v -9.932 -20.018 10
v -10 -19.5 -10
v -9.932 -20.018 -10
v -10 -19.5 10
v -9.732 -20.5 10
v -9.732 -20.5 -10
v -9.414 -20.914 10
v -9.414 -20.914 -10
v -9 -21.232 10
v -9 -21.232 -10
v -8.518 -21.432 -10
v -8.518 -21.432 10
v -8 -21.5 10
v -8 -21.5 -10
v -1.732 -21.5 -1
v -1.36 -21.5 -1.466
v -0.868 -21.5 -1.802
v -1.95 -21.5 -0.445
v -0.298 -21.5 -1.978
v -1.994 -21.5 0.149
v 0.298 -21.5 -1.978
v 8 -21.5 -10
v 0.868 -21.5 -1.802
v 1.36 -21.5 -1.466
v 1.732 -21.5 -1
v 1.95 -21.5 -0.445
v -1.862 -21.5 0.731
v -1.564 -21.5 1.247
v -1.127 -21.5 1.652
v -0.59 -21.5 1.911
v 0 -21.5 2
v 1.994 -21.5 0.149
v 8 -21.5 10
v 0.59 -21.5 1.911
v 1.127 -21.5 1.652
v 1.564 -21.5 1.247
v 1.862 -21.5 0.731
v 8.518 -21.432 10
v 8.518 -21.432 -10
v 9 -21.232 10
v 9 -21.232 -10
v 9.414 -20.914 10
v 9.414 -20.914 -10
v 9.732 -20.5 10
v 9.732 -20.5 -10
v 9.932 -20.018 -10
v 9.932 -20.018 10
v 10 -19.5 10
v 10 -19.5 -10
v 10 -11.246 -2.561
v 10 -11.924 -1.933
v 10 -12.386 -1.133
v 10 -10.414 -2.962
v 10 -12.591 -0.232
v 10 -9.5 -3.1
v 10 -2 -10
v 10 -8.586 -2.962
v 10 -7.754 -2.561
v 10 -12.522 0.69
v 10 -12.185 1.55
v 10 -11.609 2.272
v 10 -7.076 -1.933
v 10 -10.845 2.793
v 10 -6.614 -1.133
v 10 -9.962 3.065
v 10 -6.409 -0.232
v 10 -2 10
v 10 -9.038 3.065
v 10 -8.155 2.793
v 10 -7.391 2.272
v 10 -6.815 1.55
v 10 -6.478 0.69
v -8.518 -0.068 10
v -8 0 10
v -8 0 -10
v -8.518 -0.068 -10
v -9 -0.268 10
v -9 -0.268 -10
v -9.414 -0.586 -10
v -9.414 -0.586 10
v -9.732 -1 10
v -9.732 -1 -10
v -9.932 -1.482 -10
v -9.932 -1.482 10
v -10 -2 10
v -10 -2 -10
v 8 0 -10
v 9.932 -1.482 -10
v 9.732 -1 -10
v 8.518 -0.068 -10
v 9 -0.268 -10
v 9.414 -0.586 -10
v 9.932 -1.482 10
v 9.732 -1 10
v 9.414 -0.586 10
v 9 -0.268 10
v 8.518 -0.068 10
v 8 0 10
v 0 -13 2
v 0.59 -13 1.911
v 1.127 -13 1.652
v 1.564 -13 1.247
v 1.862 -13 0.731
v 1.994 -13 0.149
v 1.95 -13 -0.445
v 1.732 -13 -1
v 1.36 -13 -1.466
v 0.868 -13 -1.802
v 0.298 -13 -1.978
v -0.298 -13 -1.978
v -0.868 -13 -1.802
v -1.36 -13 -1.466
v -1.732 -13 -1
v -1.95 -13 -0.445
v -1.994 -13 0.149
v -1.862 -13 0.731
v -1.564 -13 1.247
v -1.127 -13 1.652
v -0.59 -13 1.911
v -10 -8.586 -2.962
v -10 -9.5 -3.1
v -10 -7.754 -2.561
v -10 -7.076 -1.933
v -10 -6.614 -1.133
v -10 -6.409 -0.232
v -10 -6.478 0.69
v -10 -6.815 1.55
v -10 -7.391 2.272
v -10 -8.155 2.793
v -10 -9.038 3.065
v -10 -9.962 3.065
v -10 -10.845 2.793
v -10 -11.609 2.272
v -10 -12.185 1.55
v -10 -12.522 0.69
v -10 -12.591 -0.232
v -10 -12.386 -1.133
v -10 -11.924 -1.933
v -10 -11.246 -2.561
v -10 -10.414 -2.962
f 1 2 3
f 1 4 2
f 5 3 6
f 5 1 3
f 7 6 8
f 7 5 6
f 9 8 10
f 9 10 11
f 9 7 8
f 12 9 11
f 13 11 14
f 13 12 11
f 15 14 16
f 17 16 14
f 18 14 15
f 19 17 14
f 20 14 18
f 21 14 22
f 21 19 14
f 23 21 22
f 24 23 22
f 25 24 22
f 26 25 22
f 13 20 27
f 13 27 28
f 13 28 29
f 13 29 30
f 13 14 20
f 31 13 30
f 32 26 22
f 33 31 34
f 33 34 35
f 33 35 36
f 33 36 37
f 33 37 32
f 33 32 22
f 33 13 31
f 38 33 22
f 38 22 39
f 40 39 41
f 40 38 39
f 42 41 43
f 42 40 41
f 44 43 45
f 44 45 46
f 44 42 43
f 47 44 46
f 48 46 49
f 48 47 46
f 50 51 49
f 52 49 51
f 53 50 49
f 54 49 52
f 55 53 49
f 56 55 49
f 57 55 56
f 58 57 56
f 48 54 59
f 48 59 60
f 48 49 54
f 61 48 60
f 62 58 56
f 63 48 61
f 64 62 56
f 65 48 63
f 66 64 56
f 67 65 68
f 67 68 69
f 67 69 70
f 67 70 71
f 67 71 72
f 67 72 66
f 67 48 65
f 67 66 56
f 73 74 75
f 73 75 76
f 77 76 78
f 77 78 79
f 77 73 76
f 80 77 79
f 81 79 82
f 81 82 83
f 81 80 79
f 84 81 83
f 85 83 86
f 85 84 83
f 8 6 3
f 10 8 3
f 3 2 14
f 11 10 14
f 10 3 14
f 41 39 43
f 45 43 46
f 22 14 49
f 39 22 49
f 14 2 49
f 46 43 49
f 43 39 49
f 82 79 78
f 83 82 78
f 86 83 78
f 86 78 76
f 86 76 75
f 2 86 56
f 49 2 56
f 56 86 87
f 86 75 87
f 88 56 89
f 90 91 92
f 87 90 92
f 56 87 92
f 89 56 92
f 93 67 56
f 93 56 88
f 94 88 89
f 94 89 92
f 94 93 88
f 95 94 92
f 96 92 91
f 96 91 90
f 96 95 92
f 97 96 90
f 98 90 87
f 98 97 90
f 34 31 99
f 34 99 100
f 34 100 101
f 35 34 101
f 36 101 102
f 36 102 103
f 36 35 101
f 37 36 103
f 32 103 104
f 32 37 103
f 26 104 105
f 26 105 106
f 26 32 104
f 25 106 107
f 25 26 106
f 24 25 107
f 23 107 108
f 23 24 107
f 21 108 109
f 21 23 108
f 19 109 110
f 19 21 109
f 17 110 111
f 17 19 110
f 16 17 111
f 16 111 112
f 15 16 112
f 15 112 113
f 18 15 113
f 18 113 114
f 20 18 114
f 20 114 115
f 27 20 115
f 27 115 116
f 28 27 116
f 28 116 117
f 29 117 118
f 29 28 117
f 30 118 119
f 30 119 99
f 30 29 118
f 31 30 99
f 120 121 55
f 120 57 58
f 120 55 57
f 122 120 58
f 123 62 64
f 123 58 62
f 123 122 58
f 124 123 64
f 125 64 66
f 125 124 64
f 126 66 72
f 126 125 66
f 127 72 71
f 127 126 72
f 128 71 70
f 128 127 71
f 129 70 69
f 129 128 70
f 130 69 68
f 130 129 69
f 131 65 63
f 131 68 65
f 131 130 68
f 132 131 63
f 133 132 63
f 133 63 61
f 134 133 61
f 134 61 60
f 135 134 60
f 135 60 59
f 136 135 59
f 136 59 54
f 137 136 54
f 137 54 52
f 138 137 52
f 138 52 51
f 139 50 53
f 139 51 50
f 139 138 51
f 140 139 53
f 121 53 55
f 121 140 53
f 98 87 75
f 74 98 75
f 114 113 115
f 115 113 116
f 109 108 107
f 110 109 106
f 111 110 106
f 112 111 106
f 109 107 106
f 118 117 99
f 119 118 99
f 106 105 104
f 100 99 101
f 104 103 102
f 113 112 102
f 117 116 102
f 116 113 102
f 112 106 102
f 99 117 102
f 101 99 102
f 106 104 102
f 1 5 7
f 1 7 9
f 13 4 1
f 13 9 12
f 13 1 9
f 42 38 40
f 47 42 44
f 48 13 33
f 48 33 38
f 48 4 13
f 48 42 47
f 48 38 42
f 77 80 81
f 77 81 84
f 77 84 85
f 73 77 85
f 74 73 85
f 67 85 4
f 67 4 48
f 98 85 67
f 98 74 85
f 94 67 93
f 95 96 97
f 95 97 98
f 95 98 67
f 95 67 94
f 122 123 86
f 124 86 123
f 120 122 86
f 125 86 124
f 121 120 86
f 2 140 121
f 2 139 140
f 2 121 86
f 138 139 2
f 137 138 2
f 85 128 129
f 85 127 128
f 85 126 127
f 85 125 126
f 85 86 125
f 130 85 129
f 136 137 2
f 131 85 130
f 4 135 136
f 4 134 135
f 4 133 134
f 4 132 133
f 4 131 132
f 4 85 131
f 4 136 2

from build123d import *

# Parameters (mm, degrees)
BOSS_EXTRUDE1_DEPTH     = 10
CUT_EXTRUDE1_DEPTH      = 26.734218465
CUT_EXTRUDE1_DEPTH_BACK = 26.734218465
SKETCH2_R               = 3.1
SKETCH3_R               = 2
CUT_EXTRUDE2_DEPTH      = 8.5


with BuildPart() as part:
    # Sketch1 → Boss-Extrude1 (new, symmetric)
    with BuildSketch(Plane.XY):
        with BuildLine():
            Line((-8, -21.5), (8, -21.5))
            ThreePointArc((8, -21.5), (9.414213562, -20.914213562), (10, -19.5))
            Line((10, -19.5), (10, -2))
            ThreePointArc((10, -2), (9.414213562, -0.585786438), (8, 0))
            Line((8, 0), (-8, 0))
            ThreePointArc((-8, 0), (-9.414213562, -0.585786438), (-10, -2))
            Line((-10, -2), (-10, -19.5))
            ThreePointArc((-10, -19.5), (-9.414213562, -20.914213562), (-8, -21.5))
        make_face()
    extrude(amount=BOSS_EXTRUDE1_DEPTH, both=True)

    # Sketch2 → Cut-Extrude1 (cut, two sides: drawn at the far end of the back side and taken through both)
    with BuildSketch(Plane(origin=(0, 0, 0), x_dir=(0, 0, -1), z_dir=(1, 0, 0)).offset(-CUT_EXTRUDE1_DEPTH_BACK)):
        with Locations((0, -9.5)):
            Circle(SKETCH2_R)
    extrude(amount=CUT_EXTRUDE1_DEPTH + CUT_EXTRUDE1_DEPTH_BACK, mode=Mode.SUBTRACT)

    # Sketch3 → Cut-Extrude2 (cut)
    with BuildSketch(Plane(origin=(0, -21.5, 0), x_dir=(1, 0, 0), z_dir=(0, 1, 0))):
        with Locations(Location((0, 0, 0), (0, 0, 270))):
            Circle(SKETCH3_R)
    extrude(amount=CUT_EXTRUDE2_DEPTH, mode=Mode.SUBTRACT)


solid = part.part
